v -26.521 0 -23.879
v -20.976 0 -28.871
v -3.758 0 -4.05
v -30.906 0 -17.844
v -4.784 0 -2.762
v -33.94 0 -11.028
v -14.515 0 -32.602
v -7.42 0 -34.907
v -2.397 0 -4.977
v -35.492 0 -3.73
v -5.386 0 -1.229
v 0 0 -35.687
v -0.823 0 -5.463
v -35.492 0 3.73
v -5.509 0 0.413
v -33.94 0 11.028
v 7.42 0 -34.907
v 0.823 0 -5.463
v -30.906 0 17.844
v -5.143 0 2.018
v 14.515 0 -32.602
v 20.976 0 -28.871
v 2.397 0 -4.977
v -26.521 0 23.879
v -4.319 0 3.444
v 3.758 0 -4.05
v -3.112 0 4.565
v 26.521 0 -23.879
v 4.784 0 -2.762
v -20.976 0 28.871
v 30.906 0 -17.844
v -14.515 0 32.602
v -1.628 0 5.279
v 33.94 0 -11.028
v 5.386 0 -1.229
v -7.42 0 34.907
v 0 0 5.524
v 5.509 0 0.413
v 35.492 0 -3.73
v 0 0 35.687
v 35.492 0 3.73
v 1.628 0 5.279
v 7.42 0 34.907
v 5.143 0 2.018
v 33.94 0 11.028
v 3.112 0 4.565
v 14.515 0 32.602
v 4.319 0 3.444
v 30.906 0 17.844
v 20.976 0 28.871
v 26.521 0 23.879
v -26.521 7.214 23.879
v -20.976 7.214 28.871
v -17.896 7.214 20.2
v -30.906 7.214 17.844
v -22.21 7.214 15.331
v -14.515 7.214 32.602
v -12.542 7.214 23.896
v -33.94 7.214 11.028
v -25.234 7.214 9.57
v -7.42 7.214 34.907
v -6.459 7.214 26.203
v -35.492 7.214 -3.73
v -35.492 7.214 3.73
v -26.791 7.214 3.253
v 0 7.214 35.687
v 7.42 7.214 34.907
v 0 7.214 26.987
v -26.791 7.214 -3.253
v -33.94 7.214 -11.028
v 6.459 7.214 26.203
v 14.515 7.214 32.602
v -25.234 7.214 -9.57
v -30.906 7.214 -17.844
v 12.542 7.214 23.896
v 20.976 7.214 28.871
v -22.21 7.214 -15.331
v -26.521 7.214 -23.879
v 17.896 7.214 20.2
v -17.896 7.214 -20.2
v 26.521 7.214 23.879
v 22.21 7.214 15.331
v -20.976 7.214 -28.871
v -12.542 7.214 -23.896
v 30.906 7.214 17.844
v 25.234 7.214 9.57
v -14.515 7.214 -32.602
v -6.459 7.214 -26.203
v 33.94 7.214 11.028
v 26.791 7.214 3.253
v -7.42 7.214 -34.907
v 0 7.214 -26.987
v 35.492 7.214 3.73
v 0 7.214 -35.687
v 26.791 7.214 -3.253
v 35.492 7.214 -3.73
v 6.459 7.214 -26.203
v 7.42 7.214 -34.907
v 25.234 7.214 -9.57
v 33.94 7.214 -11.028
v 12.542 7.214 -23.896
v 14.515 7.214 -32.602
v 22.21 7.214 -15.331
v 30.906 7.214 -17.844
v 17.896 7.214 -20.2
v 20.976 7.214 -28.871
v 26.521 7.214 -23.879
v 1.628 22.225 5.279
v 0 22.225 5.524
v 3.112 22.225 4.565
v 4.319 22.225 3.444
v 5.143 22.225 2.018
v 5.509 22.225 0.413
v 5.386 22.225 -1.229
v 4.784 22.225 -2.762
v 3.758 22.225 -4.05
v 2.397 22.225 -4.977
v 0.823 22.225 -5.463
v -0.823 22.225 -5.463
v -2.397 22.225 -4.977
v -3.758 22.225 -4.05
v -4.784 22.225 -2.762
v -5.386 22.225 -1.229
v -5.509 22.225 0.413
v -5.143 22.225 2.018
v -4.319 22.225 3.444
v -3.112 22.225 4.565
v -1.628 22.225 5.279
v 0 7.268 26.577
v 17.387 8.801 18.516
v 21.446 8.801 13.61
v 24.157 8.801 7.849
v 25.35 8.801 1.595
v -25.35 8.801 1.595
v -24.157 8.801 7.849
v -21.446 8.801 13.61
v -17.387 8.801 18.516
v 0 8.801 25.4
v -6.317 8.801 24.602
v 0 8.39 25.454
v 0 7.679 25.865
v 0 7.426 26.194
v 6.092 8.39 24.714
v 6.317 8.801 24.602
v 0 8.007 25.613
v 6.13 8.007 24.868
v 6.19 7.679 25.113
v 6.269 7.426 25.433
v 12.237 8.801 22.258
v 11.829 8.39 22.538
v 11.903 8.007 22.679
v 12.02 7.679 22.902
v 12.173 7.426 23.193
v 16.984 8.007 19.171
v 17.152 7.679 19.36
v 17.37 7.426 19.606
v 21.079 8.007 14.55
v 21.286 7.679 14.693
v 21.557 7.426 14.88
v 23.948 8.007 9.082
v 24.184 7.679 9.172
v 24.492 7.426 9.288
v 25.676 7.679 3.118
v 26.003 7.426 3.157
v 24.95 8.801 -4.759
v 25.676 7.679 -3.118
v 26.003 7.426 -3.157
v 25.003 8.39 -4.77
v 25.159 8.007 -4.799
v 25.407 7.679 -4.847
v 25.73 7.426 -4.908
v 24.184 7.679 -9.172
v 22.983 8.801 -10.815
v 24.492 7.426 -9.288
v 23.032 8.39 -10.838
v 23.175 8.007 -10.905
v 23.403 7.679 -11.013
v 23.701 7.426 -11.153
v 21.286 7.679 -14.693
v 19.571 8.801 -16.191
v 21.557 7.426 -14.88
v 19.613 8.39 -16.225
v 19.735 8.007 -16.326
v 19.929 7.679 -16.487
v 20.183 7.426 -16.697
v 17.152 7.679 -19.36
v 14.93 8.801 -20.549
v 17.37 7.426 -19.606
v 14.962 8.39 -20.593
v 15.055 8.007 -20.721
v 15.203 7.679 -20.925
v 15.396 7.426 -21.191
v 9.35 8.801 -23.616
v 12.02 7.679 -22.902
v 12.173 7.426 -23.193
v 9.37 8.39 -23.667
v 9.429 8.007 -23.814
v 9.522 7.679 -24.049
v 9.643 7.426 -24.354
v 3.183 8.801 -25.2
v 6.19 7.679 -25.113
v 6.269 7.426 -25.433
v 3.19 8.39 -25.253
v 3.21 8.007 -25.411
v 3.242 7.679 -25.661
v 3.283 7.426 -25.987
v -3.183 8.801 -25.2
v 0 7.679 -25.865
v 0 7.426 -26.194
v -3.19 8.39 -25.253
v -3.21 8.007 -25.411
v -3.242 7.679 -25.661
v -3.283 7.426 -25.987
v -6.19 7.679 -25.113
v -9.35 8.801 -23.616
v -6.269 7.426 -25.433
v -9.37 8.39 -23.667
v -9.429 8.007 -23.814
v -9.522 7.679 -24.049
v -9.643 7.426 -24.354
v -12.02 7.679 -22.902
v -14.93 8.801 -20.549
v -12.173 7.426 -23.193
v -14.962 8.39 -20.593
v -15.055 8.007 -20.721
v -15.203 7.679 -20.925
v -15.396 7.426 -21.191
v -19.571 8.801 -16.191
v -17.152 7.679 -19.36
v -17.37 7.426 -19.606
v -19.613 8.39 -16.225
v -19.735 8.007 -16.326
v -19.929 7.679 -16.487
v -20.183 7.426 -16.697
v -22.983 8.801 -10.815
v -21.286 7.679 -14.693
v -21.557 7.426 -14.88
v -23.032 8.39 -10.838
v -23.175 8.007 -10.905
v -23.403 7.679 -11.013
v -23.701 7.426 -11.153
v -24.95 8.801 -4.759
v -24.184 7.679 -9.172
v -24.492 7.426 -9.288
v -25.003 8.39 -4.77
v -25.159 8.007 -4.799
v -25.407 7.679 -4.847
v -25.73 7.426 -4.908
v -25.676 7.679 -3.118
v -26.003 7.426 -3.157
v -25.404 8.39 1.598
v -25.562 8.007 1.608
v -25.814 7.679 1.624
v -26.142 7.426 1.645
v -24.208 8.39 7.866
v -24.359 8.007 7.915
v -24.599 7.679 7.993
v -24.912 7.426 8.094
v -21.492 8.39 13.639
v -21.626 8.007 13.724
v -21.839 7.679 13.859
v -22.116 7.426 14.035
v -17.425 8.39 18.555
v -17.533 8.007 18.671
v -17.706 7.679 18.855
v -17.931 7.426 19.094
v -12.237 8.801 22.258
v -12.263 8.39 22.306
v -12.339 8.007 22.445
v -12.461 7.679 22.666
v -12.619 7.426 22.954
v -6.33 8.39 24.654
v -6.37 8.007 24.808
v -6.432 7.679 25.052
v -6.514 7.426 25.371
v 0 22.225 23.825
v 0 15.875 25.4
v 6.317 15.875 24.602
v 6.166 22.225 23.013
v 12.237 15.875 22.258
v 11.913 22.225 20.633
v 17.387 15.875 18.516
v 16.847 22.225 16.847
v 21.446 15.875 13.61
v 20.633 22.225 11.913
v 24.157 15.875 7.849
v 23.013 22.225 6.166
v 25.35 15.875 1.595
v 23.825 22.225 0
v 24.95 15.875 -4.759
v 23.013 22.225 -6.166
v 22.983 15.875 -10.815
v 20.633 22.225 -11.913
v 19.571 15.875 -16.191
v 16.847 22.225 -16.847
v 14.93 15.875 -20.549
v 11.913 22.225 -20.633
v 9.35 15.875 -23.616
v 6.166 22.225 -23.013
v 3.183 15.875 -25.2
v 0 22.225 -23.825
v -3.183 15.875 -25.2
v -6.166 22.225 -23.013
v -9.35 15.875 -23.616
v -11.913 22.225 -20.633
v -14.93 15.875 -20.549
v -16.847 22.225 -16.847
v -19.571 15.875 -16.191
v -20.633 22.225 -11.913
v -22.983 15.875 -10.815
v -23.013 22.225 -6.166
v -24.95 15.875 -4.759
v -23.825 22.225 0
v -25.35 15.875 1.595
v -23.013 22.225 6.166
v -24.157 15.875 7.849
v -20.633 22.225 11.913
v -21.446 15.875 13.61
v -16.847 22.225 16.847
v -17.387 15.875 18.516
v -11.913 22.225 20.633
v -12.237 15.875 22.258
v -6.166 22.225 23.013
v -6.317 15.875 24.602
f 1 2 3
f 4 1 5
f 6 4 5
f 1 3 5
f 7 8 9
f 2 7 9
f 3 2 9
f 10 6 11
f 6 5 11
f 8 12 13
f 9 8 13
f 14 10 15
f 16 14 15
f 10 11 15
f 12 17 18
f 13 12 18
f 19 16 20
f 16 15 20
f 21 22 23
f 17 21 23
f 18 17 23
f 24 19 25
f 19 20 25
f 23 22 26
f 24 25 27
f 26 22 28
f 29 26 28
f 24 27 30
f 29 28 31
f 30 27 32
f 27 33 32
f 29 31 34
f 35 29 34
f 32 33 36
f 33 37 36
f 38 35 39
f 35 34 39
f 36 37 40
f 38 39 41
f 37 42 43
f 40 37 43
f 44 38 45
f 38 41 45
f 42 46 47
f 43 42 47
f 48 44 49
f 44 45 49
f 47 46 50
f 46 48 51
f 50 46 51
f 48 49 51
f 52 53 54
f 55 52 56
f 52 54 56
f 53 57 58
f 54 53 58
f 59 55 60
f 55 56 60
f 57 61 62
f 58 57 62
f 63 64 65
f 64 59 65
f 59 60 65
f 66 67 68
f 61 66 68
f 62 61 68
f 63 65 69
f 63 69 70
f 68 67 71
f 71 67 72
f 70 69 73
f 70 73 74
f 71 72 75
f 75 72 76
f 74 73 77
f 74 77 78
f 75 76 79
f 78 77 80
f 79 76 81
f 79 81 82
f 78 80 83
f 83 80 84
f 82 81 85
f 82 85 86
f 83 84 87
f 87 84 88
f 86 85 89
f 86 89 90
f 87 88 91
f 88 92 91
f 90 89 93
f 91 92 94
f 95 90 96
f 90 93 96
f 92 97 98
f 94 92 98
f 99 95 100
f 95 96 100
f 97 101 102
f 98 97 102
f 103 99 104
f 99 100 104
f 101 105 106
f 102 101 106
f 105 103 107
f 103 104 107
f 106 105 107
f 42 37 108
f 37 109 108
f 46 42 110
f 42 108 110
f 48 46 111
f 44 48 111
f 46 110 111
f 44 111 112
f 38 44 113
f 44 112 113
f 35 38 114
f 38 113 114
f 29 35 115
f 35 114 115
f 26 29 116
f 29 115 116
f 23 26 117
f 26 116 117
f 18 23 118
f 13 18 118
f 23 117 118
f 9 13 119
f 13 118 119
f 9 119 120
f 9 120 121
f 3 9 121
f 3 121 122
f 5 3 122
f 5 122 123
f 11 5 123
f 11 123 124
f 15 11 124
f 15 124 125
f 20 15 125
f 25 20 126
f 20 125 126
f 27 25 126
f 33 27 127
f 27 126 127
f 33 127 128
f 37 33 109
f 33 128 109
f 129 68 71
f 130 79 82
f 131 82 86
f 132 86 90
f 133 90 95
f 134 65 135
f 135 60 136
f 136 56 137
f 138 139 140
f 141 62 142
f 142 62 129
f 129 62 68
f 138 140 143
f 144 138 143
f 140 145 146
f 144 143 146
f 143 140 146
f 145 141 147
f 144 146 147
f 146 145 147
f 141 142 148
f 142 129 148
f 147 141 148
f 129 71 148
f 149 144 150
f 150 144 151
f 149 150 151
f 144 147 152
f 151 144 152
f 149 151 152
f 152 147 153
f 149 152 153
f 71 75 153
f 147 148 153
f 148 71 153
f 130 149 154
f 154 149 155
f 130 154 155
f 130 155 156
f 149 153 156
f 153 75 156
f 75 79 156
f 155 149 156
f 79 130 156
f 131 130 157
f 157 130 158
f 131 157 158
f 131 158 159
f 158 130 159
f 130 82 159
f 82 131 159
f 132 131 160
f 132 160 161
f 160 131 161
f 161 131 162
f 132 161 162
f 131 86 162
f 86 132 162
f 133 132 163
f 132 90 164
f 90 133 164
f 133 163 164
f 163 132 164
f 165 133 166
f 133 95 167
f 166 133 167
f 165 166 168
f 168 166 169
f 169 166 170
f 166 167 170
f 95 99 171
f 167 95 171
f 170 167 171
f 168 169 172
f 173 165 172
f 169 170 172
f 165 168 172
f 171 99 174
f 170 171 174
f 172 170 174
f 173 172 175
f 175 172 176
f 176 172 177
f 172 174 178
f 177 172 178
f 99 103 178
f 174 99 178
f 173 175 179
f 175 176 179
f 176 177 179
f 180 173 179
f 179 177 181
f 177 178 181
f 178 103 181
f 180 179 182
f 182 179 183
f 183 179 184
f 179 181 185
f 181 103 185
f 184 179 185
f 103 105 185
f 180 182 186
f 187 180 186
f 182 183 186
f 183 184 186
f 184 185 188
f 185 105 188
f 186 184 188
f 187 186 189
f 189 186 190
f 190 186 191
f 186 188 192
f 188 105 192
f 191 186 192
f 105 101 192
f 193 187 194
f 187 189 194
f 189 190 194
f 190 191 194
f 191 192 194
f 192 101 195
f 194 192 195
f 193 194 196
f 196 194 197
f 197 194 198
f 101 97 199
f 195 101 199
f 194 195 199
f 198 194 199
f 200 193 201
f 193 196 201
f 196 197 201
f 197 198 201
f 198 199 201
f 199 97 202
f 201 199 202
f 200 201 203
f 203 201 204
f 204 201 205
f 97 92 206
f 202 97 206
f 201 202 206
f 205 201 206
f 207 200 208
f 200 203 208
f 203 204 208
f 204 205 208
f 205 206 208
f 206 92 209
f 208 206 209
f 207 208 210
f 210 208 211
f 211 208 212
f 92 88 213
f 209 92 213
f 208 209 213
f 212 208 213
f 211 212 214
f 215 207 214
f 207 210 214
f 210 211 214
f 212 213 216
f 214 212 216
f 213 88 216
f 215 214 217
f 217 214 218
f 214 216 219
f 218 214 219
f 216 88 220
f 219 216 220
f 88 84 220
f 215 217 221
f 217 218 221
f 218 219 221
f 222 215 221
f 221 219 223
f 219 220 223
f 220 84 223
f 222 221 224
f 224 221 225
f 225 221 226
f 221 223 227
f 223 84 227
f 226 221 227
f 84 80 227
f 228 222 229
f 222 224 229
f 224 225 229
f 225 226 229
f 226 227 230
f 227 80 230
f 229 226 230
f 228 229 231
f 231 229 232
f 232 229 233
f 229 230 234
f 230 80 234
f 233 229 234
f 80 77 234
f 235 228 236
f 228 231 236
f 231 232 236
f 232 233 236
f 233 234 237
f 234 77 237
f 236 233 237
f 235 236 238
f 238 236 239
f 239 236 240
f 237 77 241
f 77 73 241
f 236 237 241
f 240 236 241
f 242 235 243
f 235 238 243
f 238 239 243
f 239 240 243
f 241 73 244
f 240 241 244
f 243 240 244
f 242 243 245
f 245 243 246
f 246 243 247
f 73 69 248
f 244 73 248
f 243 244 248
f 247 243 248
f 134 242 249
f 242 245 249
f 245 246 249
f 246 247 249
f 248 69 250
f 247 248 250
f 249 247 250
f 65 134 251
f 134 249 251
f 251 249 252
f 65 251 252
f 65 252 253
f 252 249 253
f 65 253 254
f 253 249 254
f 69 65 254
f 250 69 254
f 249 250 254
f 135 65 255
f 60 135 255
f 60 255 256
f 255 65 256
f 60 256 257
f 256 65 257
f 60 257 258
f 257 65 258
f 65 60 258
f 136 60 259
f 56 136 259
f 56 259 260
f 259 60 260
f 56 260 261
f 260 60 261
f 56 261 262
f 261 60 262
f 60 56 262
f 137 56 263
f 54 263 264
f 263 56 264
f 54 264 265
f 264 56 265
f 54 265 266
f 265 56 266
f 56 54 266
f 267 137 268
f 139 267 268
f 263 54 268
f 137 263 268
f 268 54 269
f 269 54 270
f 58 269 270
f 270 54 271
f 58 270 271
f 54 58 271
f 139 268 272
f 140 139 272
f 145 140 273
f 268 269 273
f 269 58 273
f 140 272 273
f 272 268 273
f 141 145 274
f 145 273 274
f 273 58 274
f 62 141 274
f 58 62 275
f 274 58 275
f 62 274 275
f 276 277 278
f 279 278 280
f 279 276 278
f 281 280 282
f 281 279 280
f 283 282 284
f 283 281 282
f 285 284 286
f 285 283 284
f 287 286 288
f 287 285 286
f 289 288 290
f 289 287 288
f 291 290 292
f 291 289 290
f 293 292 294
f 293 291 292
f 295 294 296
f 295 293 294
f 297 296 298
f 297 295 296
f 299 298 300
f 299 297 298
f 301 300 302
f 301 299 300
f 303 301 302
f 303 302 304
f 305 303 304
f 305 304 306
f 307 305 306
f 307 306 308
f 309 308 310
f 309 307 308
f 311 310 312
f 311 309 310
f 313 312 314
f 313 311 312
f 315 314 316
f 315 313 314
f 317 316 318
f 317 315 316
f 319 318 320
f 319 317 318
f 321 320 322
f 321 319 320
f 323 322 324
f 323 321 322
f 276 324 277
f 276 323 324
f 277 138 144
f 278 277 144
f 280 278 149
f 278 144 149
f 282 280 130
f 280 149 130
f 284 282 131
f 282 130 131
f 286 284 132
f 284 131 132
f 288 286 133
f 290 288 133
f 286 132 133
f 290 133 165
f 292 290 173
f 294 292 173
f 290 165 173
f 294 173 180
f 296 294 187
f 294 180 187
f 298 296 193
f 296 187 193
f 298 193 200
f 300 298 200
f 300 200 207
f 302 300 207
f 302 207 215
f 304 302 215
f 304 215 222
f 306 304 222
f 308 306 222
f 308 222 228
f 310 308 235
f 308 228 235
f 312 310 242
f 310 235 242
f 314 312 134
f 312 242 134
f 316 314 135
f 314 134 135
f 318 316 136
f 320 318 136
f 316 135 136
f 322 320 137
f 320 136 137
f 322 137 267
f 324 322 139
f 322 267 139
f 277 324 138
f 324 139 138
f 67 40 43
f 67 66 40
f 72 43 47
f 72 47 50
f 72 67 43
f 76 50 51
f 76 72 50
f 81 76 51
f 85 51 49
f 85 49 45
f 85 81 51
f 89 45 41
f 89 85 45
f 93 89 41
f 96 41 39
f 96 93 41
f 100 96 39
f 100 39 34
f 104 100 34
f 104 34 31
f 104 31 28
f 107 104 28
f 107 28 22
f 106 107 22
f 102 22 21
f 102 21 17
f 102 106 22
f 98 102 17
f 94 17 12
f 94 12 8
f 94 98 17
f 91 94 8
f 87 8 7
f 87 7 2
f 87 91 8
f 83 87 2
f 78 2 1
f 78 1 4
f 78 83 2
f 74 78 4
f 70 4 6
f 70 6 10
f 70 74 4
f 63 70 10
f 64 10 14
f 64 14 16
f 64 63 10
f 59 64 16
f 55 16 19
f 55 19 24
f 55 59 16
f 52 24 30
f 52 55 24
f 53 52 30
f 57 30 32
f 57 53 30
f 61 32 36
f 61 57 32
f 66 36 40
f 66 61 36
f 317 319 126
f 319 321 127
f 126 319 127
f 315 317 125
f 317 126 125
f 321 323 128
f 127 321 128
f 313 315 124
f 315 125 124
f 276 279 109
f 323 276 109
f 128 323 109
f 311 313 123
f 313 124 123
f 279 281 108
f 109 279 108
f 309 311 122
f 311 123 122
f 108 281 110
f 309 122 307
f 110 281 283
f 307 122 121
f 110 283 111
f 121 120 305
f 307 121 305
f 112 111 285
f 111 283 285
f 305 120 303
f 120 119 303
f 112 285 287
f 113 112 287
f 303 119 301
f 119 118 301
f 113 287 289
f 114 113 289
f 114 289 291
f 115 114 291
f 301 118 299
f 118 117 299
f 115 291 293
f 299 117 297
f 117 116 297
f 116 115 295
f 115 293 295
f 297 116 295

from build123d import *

# Parameters (mm, degrees)
F0_W     = 15.0114
F0_H     = 19.8755
F0_W_2   = 7.2136
F0_H_2   = 10.287
F2_R     = 1.5875
F3_SIZE2 = 1.5748
F3_SIZE  = 6.35


with BuildPart() as f1:
    # F0 (on Right) → F1 (revolve)
    with BuildSketch(Plane.YZ):
        with Locations((14.7193, 15.46225)):
            Rectangle(F0_W, F0_H)
        with Locations((3.6068, 15.46225)):
            Rectangle(F0_W_2, F0_H)
        with Locations((3.6068, 30.5435)):
            Rectangle(F0_W_2, F0_H_2)
    revolve(axis=Axis((0, 11.1125, 0), (0, 1, 0)))

    # F2
    f2_edges = [f1.edges().sort_by_distance(p)[0] for p in [
        (0, 7.2136, -25.4),
    ]]
    fillet(f2_edges, radius=F2_R)

    # F3
    f3_edges = [f1.edges().sort_by_distance(p)[0] for p in [
        (0, 22.225, -25.4),
    ]]
    chamfer(f3_edges, length=F3_SIZE, length2=F3_SIZE2)


solid = f1.part
